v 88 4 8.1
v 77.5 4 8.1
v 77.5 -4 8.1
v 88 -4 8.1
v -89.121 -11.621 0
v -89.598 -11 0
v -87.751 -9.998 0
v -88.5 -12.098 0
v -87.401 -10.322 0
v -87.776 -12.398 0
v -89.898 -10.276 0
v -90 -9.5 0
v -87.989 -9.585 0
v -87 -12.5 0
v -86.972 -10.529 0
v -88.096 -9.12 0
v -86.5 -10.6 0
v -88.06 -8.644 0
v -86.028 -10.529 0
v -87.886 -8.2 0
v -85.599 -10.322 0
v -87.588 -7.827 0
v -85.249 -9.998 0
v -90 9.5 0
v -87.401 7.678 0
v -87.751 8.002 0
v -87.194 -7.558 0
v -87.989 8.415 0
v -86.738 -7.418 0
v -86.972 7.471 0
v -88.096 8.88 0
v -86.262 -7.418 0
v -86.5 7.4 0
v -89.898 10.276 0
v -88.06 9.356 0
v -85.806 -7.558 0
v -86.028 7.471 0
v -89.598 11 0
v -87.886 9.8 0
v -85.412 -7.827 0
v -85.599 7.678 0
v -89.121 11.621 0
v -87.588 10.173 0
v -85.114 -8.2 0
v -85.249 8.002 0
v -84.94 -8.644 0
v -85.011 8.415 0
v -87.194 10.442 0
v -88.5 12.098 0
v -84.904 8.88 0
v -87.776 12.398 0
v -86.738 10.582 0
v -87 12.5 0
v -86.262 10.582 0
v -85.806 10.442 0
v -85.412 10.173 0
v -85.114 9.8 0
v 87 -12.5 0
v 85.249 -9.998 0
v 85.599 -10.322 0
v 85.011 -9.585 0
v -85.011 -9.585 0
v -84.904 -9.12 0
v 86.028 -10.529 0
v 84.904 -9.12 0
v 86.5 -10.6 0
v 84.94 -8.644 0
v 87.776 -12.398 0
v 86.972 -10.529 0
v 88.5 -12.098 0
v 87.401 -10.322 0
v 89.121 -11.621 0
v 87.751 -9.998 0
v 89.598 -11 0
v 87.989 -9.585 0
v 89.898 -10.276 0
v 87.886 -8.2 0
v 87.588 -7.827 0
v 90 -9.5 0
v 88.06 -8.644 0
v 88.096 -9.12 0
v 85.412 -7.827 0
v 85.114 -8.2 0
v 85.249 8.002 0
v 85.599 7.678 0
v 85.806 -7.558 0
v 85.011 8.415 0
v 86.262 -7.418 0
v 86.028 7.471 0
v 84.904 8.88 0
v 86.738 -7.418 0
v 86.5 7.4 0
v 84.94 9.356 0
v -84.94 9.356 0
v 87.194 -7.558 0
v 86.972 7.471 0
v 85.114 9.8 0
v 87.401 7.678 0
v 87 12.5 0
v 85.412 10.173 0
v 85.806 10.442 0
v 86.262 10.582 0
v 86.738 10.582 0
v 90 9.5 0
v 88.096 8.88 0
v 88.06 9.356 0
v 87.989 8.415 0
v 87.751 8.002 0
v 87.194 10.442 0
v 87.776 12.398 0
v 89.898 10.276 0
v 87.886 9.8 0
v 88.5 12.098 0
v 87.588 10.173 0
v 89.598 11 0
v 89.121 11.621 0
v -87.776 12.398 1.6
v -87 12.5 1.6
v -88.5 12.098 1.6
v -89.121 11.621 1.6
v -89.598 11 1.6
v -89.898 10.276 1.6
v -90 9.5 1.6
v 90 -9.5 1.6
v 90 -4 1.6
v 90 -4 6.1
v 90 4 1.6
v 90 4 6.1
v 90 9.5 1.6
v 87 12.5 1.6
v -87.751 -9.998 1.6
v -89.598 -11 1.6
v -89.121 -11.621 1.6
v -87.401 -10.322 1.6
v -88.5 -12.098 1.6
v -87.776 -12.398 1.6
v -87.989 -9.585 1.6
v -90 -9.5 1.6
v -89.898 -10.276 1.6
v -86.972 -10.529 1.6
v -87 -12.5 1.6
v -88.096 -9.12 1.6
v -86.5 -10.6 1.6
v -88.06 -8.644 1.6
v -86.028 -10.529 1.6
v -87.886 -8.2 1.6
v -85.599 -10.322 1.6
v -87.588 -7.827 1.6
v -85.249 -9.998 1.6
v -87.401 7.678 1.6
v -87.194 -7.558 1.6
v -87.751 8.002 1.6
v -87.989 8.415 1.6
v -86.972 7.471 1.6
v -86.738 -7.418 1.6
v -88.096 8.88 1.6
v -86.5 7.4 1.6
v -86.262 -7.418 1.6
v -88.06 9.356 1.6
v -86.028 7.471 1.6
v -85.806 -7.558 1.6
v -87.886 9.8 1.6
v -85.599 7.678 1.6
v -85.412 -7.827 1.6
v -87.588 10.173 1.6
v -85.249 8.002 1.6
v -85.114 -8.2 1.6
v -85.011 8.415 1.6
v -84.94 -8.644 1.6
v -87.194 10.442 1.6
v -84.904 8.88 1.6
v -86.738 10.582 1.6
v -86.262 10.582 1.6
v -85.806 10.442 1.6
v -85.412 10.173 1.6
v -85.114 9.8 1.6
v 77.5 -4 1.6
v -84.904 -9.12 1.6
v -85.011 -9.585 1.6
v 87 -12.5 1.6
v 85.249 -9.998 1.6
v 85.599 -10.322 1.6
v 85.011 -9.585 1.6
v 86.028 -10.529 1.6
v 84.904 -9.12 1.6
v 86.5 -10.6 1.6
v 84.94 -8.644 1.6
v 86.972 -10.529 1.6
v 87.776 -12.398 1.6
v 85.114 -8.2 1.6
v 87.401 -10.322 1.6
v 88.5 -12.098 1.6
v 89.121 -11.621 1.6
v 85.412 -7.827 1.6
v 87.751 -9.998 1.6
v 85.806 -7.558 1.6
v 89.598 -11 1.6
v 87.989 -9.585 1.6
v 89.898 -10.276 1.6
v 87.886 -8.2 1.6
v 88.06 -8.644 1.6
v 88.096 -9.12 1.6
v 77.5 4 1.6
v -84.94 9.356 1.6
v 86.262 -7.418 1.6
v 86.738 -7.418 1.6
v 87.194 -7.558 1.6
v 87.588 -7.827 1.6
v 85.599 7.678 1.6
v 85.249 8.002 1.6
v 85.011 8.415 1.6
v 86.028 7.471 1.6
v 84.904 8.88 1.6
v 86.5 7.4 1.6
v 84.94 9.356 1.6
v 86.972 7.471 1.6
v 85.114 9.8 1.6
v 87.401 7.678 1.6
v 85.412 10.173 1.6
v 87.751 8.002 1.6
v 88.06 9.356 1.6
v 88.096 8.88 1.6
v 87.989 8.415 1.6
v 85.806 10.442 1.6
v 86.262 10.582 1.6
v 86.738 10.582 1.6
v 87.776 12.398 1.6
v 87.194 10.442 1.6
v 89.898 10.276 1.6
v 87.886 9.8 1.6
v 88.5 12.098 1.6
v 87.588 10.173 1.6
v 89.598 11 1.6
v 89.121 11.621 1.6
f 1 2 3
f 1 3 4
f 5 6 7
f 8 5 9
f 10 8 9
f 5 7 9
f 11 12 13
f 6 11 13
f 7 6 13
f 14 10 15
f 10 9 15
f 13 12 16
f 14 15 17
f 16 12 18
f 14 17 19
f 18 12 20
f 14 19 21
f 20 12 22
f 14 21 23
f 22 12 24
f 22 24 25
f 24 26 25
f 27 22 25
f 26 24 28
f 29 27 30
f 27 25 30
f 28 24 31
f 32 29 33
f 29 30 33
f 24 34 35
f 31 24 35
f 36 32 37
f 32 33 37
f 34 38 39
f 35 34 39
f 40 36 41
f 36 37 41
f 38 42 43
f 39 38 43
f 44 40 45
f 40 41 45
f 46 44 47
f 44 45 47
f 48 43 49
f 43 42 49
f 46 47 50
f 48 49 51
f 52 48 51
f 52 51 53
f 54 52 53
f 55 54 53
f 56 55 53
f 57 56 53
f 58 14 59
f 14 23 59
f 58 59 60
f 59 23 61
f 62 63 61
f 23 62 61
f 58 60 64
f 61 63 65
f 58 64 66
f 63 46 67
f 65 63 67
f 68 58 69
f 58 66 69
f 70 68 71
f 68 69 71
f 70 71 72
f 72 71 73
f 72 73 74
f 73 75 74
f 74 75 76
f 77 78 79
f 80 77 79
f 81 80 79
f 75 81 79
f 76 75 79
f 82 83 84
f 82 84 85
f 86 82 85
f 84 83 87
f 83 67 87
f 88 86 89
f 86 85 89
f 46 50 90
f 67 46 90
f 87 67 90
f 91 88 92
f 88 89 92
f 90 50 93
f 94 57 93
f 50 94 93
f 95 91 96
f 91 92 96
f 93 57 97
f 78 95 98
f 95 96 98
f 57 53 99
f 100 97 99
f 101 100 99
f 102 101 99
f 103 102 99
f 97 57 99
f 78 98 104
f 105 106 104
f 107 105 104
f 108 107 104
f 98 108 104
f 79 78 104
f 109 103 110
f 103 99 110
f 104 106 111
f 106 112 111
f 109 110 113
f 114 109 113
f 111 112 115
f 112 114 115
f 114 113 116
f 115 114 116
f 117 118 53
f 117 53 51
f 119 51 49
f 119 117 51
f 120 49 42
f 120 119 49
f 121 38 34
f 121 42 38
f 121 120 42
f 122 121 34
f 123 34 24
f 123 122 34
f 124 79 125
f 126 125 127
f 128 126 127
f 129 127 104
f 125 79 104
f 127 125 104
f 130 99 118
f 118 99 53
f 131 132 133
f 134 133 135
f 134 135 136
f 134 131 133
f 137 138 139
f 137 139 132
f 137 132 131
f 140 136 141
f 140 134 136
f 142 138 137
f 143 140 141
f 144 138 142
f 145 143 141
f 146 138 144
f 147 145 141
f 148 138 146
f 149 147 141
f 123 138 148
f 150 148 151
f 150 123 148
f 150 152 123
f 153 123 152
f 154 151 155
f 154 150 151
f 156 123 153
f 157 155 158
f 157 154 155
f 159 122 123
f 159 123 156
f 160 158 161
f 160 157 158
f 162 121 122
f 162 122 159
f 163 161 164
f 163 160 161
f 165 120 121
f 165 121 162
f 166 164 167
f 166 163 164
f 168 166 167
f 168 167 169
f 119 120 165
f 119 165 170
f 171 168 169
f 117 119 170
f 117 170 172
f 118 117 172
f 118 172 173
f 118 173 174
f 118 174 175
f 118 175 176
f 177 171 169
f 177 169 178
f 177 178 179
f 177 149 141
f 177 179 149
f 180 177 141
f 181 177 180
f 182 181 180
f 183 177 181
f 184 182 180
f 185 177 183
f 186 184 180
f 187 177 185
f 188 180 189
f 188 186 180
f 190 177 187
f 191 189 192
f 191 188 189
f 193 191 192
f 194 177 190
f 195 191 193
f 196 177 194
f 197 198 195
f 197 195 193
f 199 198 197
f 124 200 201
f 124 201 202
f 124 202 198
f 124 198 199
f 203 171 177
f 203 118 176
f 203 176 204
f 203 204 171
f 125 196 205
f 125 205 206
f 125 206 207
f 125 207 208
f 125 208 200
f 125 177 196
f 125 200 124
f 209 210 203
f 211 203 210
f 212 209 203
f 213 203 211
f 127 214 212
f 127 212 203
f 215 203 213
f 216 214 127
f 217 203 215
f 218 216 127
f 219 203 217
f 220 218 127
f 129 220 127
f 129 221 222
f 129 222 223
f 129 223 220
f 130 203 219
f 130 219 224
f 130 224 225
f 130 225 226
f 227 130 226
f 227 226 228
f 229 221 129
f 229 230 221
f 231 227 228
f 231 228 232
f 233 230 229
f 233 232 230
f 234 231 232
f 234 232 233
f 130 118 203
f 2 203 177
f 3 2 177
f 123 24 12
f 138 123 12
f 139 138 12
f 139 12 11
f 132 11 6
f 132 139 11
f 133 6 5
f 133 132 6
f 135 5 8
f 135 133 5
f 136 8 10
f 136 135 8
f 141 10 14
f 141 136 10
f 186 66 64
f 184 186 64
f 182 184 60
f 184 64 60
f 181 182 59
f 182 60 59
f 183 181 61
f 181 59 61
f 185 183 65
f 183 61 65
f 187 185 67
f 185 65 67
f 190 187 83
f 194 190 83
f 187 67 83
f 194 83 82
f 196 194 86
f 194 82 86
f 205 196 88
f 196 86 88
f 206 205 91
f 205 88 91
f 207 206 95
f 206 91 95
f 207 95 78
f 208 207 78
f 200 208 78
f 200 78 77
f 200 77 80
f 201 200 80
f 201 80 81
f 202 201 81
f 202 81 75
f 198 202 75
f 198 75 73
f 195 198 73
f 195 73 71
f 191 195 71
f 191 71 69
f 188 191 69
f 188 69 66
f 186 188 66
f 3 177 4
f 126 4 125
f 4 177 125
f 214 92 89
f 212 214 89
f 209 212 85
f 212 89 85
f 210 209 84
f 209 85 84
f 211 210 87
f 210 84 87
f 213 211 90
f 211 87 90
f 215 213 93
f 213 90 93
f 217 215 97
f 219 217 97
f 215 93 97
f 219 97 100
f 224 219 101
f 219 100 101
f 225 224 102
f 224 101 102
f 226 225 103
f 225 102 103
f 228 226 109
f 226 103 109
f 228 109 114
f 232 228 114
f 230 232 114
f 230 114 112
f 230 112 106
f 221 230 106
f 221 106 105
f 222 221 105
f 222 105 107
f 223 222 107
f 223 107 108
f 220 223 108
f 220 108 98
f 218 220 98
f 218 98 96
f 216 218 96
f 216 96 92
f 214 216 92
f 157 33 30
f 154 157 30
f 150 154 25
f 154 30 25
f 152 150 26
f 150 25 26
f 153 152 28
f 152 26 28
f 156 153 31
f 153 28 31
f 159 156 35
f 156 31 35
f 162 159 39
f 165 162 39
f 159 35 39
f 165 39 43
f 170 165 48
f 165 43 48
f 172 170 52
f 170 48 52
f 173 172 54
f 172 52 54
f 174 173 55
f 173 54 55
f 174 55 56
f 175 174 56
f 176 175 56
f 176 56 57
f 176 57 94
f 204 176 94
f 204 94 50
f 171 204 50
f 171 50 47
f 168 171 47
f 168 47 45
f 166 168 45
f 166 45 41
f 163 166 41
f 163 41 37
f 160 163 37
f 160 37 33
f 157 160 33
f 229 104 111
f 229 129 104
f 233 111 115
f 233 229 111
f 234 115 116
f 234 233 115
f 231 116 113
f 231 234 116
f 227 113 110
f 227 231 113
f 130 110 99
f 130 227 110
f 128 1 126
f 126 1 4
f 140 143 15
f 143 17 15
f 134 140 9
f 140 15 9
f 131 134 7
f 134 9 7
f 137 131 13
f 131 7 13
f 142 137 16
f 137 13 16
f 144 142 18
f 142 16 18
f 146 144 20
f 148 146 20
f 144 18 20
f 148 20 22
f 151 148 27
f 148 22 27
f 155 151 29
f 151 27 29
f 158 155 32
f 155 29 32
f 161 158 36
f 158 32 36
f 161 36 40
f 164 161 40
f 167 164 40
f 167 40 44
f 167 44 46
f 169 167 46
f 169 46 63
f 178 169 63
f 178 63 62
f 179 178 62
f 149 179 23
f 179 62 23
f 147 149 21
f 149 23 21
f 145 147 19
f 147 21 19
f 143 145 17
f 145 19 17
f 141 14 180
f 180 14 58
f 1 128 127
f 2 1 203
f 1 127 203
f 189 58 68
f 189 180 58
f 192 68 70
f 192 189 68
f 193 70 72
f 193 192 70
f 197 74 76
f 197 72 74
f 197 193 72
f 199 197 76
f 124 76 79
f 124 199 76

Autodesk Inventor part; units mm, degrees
ref_plane "YZ Plane" through (0, 0, 0) normal (1, 0, 0) x (0, 1, 0)
ref_plane "XZ Plane" through (0, 0, 0) normal (0, 1, 0) x (-1, 0, 0)
ref_plane "XY Plane" through (0, 0, 0) normal (0, 0, 1) x (1, 0, 0)
sketch "Sketch1" plane through (0, 0, 0) normal (0, 0, 1) x (1, 0, 0)
  line L0 (-90, -12.5) -> (90, -12.5)
  line L1 (90, -12.5) -> (90, 12.5)
  line L2 (90, 12.5) -> (-90, 12.5)
  line L3 (-90, 12.5) -> (-90, -12.5)
  point P0 (0, 0)
  dimension "d0" = 25
  dimension "d1" = 12.5
  dimension "d2" = 180
  dimension "d3" = 90
extrude "Extrusion1" add sketch "Sketch1" along normal blind 1.6
fillet "Fillet1" radius 3 4 edges at (-90, -12.5, 0.8) (-90, 12.5, 0.8) (90, -12.5, 0.8) (90, 12.5, 0.8)
sketch "Sketch2" plane through (0, 0, 1.6) normal (0, 0, 1) x (1, 0, 0)
  line L0 (-86.5, 9) -> (86.5, 9) construction
  line L1 (86.5, 9) -> (86.5, -9) construction
  line L2 (86.5, -9) -> (-86.5, -9) construction
  line L3 (-86.5, -9) -> (-86.5, 9) construction
  point P0 (0, 0)
  dimension "d7" = 18
  dimension "d8" = 9
  dimension "d9" = 173
  dimension "d10" = 86.5
hole "Hole1" at (-86.5, 9, 1.6) at (-86.5, -9, 1.6) at (86.5, -9, 1.6) at (86.5, 9, 1.6) direction (0, 0, -1) diameter 3.2 end through all
sketch "Sketch4" plane through (0, 0, 1.6) normal (0, 0, 1) x (1, 0, 0)
  line L0 (90, -9.5) -> (90, 9.5) projected
  line L1 (90, 4) -> (77.5, 4)
  line L2 (77.5, 4) -> (77.5, -4)
  line L3 (77.5, -4) -> (90, -4)
  line L4 (90, -4) -> (90, 4)
  point P0 (0, 0)
  dimension "d20" = 8
  dimension "d21" = 4
  dimension "d22" = 12.5
extrude "Extrusion3" add sketch "Sketch4" along normal blind 6.5
chamfer "Chamfer1" distance 2 angle 45 1 edges at (90, 0, 8.1)
equation "\"d1\" = 0.5 * d0"
equation "\"d3\" = 0.5 * d2"
equation "\"d8\" = 0.5 * d7"
equation "\"d10\" = 0.5 * d9"
equation "\"d21\" = 0.5 * d20"
properties part number "SH8_003.1-sunhub8-PCB"
